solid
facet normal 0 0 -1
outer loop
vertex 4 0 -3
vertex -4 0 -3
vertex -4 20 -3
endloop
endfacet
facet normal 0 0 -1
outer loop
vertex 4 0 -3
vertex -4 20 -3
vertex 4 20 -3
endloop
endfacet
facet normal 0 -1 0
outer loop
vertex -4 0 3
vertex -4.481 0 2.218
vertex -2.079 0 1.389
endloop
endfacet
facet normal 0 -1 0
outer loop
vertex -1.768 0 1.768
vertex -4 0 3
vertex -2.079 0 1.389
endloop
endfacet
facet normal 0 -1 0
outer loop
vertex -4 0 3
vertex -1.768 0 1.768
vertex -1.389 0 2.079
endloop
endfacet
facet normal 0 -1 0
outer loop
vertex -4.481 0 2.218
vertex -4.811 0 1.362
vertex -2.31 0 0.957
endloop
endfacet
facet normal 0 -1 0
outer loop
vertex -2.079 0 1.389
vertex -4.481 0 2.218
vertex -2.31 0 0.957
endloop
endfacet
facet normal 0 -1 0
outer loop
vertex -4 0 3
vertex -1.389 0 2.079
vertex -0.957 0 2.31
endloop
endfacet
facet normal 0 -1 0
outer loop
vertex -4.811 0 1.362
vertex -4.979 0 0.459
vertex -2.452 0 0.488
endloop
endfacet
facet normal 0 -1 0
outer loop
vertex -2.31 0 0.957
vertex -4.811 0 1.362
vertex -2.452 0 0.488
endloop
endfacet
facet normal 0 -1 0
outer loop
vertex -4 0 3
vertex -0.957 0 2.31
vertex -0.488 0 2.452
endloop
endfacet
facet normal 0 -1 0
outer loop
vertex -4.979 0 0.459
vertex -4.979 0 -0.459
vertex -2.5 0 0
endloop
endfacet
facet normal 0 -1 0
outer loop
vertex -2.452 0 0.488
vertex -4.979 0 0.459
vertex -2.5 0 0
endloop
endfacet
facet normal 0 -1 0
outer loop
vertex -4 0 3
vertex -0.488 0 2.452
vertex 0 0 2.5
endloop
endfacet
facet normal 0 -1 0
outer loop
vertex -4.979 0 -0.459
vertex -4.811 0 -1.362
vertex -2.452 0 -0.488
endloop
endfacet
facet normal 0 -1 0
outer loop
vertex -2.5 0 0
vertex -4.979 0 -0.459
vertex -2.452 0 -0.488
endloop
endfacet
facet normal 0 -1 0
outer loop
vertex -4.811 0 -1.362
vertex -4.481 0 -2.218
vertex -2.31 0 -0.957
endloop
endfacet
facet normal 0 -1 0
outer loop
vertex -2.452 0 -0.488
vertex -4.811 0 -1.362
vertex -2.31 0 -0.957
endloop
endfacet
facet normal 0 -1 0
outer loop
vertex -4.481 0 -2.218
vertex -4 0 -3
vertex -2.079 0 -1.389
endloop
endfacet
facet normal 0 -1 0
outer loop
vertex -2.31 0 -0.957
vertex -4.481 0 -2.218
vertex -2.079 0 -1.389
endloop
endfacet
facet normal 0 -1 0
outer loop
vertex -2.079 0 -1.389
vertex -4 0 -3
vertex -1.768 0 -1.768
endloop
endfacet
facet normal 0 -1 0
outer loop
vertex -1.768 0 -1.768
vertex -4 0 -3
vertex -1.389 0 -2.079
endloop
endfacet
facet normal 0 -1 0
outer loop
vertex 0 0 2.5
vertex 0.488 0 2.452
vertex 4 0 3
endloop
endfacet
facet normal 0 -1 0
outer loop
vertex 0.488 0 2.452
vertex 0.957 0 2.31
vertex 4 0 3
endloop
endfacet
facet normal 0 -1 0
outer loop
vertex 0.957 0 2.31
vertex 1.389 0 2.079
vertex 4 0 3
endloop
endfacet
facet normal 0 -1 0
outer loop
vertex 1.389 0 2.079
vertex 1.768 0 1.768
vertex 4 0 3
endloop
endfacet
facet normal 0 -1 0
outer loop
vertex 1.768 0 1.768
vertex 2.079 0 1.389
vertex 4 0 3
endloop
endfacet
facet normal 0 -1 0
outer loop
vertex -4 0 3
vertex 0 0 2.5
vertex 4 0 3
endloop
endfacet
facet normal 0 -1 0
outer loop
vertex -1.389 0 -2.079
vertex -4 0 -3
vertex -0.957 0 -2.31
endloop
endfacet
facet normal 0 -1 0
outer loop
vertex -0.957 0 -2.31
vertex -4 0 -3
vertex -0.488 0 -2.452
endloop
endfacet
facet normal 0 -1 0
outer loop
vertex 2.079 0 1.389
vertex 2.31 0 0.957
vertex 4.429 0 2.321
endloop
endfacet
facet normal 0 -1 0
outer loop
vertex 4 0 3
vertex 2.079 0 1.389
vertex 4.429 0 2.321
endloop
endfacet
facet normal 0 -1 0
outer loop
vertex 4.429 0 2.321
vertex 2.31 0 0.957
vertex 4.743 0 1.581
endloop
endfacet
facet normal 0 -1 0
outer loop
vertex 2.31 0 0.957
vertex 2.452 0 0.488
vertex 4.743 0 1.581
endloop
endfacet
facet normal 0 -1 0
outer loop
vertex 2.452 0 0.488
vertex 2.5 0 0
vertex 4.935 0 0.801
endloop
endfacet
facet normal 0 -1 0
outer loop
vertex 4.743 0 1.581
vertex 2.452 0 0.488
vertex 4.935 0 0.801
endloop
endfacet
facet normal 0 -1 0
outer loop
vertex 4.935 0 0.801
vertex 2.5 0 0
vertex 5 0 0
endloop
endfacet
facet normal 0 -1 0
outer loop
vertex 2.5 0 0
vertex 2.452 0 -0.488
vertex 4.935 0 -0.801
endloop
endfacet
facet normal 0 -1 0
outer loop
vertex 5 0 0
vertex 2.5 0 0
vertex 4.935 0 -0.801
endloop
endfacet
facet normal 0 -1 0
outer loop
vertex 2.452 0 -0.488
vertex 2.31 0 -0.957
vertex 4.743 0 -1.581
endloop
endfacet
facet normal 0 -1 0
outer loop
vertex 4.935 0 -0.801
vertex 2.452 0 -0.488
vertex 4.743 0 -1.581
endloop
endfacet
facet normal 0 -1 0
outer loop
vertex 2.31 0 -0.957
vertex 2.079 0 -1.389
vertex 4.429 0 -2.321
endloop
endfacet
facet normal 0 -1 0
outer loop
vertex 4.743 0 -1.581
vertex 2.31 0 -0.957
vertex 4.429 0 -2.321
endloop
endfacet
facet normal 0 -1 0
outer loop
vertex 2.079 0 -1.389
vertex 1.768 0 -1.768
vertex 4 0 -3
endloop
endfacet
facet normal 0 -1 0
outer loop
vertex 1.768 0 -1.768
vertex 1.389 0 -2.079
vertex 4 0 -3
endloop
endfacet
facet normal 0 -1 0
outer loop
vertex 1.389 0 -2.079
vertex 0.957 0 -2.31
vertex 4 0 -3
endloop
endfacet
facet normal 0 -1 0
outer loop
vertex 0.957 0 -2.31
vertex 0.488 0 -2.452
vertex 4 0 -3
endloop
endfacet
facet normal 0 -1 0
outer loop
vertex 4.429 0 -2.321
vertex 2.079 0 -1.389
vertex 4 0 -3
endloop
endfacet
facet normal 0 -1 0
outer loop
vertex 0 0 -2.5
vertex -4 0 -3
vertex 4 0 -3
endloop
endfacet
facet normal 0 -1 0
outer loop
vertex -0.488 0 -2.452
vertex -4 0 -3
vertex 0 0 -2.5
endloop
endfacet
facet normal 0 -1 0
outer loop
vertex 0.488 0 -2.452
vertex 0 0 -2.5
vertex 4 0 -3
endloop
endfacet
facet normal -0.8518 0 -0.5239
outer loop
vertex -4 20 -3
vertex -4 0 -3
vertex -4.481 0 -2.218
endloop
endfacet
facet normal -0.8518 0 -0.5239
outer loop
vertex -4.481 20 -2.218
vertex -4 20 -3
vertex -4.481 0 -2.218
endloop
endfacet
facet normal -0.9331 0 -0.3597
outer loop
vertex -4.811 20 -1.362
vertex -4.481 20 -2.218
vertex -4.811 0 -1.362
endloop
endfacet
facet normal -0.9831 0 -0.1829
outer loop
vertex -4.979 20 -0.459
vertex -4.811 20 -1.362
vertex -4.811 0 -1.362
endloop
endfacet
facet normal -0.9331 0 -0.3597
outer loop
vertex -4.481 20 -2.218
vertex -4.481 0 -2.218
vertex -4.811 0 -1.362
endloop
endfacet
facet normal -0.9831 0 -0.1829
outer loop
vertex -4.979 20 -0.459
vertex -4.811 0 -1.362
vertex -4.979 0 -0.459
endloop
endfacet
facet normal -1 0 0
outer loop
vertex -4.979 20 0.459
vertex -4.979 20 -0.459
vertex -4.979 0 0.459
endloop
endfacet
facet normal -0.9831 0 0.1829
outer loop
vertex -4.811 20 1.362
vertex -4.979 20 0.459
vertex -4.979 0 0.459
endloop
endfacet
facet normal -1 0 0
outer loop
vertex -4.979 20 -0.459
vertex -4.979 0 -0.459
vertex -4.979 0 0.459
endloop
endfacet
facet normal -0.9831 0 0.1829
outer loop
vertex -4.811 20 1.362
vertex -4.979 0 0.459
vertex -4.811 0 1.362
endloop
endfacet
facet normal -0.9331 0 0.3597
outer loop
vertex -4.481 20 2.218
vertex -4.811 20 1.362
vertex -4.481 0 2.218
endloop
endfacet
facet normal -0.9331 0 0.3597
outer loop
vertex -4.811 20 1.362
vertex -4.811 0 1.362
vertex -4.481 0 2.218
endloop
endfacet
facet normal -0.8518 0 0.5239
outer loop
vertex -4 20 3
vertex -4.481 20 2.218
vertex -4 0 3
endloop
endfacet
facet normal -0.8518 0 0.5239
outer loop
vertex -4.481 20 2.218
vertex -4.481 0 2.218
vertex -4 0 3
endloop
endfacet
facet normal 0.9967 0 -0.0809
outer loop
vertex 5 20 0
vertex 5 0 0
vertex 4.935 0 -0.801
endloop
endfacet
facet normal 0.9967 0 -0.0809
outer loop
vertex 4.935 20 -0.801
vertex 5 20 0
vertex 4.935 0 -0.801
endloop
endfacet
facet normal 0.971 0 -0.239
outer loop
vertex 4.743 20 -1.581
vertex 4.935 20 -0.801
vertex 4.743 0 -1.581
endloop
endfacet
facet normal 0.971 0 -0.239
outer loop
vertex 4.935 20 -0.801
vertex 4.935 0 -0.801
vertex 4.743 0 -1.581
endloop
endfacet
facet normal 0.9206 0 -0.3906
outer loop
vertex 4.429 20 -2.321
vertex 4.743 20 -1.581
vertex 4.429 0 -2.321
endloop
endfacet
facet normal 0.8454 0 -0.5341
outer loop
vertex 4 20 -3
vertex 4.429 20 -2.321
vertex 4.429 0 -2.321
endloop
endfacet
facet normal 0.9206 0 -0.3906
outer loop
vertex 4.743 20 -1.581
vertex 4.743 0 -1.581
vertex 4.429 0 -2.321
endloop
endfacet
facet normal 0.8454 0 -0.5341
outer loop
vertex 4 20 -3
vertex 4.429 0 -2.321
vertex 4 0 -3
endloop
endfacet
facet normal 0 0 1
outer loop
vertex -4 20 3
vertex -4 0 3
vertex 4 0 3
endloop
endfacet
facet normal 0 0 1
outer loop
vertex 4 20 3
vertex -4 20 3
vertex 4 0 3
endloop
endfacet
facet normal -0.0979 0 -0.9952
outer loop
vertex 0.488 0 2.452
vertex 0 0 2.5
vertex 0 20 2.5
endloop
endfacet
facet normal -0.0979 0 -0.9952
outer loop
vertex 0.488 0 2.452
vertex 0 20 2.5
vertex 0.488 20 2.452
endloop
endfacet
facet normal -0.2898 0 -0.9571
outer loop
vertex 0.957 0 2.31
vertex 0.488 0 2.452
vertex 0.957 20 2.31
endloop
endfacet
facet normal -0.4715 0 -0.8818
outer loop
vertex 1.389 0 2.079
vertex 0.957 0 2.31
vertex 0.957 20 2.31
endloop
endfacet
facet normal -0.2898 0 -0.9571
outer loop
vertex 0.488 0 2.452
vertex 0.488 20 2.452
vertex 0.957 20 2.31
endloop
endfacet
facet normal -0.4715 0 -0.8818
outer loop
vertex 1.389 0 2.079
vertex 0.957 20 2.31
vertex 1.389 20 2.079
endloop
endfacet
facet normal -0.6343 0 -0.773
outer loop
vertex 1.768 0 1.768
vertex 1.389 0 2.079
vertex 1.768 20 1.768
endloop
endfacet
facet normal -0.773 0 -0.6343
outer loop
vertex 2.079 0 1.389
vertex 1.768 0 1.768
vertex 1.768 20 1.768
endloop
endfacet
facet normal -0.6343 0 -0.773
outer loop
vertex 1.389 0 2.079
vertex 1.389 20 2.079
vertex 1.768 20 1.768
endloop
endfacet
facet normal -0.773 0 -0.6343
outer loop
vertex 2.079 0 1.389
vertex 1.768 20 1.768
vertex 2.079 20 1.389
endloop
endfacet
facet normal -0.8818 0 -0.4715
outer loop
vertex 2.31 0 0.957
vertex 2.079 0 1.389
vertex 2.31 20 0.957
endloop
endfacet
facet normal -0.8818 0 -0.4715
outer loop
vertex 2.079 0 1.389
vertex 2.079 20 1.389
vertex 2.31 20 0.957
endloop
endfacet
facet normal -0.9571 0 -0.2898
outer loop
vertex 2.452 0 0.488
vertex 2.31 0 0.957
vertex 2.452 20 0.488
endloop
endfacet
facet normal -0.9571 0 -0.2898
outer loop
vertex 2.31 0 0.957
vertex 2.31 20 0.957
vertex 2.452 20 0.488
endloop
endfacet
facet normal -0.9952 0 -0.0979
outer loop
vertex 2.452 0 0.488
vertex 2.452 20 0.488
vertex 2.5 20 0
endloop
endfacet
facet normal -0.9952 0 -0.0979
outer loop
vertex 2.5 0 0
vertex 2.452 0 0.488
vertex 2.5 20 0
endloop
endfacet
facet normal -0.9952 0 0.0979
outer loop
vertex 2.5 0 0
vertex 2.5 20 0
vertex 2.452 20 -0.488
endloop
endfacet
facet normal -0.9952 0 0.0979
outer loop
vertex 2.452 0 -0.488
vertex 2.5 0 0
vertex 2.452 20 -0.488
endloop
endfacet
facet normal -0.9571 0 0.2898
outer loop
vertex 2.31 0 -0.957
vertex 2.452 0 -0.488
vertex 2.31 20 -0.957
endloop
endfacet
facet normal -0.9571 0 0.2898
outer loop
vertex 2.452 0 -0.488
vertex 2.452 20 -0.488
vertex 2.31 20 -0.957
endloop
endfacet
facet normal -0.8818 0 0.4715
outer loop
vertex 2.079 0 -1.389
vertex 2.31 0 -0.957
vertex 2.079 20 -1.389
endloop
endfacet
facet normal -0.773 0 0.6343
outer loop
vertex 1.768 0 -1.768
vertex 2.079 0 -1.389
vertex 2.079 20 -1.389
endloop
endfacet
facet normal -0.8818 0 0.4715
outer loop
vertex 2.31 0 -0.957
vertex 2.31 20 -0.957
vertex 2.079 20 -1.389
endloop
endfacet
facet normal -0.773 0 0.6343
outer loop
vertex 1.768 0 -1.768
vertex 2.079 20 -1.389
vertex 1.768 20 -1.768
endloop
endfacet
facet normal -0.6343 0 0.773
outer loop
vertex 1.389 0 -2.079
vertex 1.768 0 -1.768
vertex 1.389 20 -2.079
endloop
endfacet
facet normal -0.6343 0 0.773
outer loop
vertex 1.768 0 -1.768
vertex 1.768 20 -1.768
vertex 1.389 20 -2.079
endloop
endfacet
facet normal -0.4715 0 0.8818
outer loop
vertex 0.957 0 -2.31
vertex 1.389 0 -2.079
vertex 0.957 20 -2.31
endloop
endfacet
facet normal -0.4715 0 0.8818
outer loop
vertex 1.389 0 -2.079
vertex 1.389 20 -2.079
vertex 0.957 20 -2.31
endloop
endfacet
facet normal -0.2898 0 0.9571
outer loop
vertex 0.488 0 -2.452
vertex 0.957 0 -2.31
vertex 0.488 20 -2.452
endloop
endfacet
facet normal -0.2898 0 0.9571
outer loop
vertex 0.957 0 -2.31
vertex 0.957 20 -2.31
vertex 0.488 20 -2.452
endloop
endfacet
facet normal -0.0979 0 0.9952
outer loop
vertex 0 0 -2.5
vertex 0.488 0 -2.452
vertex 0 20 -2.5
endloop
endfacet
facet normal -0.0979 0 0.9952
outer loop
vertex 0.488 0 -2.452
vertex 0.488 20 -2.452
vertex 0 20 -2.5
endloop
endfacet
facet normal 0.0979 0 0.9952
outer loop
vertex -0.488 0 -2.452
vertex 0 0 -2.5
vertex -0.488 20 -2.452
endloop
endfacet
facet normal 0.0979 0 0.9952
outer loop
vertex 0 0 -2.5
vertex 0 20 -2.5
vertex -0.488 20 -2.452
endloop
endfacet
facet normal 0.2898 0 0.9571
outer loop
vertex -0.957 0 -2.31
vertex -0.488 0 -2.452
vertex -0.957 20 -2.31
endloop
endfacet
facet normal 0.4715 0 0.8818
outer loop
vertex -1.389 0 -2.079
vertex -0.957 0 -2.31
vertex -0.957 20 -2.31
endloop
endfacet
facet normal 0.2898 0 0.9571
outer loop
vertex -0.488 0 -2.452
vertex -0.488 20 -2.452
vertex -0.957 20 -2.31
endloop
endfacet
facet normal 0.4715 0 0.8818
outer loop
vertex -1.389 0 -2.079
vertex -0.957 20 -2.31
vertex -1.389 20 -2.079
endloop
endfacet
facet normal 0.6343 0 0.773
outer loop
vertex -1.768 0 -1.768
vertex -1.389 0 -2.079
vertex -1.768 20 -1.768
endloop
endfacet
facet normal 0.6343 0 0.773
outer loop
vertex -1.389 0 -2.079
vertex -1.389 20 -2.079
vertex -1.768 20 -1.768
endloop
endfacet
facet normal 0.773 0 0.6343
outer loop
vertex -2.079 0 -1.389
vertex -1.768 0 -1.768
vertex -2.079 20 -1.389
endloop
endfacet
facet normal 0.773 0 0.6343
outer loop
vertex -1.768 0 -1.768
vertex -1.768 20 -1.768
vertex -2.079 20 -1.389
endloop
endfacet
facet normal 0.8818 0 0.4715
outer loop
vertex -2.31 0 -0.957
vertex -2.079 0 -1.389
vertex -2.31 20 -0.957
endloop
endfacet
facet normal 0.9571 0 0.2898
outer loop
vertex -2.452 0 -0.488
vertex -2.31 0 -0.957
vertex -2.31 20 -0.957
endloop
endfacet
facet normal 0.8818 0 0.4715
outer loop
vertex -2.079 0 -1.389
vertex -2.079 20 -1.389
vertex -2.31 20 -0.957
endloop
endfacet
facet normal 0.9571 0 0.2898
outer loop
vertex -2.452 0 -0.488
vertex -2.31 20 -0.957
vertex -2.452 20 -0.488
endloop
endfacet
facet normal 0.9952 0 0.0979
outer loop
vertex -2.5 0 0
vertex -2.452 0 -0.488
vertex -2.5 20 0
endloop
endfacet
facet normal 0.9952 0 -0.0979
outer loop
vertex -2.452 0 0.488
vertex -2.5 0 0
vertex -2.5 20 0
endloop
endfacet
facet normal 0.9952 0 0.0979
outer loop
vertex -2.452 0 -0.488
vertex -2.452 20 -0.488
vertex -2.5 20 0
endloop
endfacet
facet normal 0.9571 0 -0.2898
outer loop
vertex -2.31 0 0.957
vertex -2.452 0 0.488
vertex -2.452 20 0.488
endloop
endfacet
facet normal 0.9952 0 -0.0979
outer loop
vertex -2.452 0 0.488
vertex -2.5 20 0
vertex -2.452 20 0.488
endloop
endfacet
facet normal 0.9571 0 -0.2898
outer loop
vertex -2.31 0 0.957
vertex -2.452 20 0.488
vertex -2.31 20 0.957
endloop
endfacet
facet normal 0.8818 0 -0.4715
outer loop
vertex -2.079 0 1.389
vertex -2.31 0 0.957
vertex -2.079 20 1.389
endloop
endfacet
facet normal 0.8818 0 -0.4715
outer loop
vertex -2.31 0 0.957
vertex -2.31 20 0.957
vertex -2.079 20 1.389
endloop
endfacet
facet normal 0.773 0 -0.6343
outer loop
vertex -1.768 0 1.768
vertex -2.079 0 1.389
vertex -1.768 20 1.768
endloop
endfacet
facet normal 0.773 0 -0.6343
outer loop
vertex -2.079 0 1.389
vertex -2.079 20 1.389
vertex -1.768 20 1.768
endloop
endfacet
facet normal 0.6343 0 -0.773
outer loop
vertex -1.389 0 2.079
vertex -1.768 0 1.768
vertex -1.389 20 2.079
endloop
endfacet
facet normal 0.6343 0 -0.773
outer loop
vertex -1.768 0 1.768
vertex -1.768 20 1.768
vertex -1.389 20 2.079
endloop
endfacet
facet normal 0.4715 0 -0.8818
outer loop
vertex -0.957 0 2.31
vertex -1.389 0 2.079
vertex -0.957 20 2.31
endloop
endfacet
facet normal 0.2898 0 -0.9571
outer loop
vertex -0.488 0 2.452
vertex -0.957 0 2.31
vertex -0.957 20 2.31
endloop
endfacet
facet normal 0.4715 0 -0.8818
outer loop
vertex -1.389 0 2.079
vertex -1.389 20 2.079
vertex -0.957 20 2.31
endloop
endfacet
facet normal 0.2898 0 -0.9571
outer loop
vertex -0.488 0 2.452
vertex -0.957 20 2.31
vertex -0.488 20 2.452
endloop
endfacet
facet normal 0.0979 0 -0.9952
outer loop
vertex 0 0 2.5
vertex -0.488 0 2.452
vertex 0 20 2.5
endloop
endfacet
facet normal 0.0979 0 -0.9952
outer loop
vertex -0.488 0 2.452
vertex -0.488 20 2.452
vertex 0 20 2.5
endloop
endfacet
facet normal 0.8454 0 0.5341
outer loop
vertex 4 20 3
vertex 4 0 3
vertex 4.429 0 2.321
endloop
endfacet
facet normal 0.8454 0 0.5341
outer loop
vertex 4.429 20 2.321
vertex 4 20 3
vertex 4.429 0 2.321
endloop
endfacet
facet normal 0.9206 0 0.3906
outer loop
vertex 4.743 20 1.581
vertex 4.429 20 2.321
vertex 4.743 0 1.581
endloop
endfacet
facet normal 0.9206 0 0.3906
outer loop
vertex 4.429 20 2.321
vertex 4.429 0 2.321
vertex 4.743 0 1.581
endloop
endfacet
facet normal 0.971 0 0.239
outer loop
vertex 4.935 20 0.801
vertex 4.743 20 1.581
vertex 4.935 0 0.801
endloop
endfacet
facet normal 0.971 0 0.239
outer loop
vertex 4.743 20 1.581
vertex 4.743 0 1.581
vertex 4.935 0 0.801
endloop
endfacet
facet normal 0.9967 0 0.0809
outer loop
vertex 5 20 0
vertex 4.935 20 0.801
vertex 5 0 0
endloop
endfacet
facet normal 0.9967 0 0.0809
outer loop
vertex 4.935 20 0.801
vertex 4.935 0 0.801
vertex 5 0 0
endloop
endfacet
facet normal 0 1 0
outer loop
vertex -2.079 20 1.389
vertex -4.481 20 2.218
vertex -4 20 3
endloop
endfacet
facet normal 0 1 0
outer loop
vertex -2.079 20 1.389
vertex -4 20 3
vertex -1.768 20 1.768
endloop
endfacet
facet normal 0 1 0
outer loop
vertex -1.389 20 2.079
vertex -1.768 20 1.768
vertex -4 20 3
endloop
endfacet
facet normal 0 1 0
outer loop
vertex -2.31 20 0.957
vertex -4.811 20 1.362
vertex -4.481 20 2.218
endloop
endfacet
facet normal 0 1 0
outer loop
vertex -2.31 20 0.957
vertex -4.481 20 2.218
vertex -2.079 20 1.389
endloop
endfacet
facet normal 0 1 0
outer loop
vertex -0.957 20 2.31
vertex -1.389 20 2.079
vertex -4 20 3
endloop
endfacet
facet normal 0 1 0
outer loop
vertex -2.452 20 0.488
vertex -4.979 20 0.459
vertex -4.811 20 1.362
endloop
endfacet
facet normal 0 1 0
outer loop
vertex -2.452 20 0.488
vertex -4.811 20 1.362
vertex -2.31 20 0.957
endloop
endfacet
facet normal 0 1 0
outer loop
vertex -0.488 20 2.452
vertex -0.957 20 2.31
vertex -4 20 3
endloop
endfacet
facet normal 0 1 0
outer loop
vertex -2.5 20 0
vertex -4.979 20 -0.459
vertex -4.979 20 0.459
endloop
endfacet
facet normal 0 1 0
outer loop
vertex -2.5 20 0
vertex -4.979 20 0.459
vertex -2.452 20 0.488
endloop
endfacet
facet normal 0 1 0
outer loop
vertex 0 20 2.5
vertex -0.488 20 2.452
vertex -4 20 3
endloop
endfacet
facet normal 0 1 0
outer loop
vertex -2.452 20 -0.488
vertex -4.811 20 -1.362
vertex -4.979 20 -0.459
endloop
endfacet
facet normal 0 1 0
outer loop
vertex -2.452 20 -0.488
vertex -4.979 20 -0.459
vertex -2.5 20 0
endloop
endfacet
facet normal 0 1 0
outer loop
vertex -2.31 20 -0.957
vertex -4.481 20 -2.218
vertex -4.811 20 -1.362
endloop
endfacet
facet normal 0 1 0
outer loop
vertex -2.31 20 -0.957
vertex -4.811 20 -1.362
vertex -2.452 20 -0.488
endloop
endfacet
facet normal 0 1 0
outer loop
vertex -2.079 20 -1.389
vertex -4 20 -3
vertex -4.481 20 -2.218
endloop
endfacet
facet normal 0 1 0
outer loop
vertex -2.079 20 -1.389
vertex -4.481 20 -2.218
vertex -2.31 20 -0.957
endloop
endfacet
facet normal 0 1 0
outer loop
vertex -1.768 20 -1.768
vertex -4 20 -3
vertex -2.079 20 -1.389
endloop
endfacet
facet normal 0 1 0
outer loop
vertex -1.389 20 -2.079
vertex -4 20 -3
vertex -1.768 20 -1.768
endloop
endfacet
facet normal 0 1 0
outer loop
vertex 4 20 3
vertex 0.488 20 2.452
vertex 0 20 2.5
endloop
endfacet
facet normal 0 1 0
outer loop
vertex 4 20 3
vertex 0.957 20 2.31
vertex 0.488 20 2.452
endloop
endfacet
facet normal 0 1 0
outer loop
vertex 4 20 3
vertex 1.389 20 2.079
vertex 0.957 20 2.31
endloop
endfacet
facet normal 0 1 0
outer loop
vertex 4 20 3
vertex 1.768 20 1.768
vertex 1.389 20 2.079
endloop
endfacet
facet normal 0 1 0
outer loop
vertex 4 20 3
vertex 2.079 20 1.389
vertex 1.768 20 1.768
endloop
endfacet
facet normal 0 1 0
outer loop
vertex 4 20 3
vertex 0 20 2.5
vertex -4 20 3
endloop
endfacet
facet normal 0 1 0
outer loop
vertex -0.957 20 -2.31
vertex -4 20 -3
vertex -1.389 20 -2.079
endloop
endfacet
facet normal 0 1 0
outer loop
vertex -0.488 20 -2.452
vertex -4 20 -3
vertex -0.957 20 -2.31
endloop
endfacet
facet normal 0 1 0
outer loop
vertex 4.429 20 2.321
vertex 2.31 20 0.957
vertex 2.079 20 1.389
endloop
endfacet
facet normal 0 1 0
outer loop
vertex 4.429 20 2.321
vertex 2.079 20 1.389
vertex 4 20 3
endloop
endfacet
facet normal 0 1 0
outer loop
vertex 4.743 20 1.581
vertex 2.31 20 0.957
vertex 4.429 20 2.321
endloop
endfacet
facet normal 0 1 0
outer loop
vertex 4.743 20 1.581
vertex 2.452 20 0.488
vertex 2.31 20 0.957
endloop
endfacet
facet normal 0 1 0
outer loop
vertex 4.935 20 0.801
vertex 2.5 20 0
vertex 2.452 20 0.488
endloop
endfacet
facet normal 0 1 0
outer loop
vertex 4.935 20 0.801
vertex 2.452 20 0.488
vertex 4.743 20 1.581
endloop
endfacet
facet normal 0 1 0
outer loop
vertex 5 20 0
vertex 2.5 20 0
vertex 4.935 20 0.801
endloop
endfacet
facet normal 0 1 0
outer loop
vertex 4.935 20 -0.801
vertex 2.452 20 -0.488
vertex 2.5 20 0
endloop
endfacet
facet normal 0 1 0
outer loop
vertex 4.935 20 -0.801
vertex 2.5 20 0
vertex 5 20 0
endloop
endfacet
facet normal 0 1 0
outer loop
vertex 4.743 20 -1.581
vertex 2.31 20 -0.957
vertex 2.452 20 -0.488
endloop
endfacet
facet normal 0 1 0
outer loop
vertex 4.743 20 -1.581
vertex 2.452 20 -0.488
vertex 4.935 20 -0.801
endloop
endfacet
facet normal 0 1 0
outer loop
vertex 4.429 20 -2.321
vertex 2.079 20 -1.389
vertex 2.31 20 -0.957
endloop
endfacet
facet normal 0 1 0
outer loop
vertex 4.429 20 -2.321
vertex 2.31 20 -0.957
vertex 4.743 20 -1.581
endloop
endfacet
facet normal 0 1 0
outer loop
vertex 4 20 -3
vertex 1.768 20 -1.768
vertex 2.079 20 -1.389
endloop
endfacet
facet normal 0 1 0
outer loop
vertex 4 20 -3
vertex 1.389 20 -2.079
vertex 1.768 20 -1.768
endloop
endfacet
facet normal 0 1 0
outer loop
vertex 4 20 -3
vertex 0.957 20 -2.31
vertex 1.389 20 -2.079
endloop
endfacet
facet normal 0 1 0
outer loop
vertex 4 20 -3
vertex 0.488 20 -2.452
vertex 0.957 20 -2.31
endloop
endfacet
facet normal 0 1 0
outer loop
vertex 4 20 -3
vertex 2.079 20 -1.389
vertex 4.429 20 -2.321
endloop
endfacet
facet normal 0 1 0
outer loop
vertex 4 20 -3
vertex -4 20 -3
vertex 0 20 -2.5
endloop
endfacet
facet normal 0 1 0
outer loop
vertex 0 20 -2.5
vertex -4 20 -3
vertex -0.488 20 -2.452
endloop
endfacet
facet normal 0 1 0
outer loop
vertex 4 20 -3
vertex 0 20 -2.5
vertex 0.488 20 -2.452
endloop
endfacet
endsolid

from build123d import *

# Parameters (mm, degrees)
SCHIZZO1_W                   = 8
SCHIZZO1_H                   = 6
ESTRUSIONE_ESTRUSIONE1_DEPTH = 20
SCHIZZO2_R                   = 2.5
TAGLIO_ESTRUSIONE1_DEPTH     = 20


with BuildPart() as part:
    # Schizzo1 → Estrusione-Estrusione1 (new body)
    with BuildSketch(Plane(origin=(0, 0, 0), x_dir=(1, 0, 0), z_dir=(0, 1, 0))):
        with BuildLine():
            Line((-4, -3), (-4, 3))
            ThreePointArc((-4, 3), (-5, 0), (-4, -3))
        make_face()
        Rectangle(SCHIZZO1_W, SCHIZZO1_H)
        with BuildLine():
            ThreePointArc((5, 0), (4.74341649, 1.58113883), (4, 3))
            Line((4, 3), (4, -3))
            ThreePointArc((4, -3), (4.74341649, -1.58113883), (5, 0))
        make_face()
    extrude(amount=ESTRUSIONE_ESTRUSIONE1_DEPTH)

    # Schizzo2 → Taglio-Estrusione1 (cut)
    with BuildSketch(Plane(origin=(0, 20, 0), x_dir=(1, 0, 0), z_dir=(0, 1, 0))):
        with Locations(Location((0, 0, 0), (0, 0, 270))):
            Circle(SCHIZZO2_R)
    extrude(amount=-TAGLIO_ESTRUSIONE1_DEPTH, mode=Mode.SUBTRACT)


solid = part.part
